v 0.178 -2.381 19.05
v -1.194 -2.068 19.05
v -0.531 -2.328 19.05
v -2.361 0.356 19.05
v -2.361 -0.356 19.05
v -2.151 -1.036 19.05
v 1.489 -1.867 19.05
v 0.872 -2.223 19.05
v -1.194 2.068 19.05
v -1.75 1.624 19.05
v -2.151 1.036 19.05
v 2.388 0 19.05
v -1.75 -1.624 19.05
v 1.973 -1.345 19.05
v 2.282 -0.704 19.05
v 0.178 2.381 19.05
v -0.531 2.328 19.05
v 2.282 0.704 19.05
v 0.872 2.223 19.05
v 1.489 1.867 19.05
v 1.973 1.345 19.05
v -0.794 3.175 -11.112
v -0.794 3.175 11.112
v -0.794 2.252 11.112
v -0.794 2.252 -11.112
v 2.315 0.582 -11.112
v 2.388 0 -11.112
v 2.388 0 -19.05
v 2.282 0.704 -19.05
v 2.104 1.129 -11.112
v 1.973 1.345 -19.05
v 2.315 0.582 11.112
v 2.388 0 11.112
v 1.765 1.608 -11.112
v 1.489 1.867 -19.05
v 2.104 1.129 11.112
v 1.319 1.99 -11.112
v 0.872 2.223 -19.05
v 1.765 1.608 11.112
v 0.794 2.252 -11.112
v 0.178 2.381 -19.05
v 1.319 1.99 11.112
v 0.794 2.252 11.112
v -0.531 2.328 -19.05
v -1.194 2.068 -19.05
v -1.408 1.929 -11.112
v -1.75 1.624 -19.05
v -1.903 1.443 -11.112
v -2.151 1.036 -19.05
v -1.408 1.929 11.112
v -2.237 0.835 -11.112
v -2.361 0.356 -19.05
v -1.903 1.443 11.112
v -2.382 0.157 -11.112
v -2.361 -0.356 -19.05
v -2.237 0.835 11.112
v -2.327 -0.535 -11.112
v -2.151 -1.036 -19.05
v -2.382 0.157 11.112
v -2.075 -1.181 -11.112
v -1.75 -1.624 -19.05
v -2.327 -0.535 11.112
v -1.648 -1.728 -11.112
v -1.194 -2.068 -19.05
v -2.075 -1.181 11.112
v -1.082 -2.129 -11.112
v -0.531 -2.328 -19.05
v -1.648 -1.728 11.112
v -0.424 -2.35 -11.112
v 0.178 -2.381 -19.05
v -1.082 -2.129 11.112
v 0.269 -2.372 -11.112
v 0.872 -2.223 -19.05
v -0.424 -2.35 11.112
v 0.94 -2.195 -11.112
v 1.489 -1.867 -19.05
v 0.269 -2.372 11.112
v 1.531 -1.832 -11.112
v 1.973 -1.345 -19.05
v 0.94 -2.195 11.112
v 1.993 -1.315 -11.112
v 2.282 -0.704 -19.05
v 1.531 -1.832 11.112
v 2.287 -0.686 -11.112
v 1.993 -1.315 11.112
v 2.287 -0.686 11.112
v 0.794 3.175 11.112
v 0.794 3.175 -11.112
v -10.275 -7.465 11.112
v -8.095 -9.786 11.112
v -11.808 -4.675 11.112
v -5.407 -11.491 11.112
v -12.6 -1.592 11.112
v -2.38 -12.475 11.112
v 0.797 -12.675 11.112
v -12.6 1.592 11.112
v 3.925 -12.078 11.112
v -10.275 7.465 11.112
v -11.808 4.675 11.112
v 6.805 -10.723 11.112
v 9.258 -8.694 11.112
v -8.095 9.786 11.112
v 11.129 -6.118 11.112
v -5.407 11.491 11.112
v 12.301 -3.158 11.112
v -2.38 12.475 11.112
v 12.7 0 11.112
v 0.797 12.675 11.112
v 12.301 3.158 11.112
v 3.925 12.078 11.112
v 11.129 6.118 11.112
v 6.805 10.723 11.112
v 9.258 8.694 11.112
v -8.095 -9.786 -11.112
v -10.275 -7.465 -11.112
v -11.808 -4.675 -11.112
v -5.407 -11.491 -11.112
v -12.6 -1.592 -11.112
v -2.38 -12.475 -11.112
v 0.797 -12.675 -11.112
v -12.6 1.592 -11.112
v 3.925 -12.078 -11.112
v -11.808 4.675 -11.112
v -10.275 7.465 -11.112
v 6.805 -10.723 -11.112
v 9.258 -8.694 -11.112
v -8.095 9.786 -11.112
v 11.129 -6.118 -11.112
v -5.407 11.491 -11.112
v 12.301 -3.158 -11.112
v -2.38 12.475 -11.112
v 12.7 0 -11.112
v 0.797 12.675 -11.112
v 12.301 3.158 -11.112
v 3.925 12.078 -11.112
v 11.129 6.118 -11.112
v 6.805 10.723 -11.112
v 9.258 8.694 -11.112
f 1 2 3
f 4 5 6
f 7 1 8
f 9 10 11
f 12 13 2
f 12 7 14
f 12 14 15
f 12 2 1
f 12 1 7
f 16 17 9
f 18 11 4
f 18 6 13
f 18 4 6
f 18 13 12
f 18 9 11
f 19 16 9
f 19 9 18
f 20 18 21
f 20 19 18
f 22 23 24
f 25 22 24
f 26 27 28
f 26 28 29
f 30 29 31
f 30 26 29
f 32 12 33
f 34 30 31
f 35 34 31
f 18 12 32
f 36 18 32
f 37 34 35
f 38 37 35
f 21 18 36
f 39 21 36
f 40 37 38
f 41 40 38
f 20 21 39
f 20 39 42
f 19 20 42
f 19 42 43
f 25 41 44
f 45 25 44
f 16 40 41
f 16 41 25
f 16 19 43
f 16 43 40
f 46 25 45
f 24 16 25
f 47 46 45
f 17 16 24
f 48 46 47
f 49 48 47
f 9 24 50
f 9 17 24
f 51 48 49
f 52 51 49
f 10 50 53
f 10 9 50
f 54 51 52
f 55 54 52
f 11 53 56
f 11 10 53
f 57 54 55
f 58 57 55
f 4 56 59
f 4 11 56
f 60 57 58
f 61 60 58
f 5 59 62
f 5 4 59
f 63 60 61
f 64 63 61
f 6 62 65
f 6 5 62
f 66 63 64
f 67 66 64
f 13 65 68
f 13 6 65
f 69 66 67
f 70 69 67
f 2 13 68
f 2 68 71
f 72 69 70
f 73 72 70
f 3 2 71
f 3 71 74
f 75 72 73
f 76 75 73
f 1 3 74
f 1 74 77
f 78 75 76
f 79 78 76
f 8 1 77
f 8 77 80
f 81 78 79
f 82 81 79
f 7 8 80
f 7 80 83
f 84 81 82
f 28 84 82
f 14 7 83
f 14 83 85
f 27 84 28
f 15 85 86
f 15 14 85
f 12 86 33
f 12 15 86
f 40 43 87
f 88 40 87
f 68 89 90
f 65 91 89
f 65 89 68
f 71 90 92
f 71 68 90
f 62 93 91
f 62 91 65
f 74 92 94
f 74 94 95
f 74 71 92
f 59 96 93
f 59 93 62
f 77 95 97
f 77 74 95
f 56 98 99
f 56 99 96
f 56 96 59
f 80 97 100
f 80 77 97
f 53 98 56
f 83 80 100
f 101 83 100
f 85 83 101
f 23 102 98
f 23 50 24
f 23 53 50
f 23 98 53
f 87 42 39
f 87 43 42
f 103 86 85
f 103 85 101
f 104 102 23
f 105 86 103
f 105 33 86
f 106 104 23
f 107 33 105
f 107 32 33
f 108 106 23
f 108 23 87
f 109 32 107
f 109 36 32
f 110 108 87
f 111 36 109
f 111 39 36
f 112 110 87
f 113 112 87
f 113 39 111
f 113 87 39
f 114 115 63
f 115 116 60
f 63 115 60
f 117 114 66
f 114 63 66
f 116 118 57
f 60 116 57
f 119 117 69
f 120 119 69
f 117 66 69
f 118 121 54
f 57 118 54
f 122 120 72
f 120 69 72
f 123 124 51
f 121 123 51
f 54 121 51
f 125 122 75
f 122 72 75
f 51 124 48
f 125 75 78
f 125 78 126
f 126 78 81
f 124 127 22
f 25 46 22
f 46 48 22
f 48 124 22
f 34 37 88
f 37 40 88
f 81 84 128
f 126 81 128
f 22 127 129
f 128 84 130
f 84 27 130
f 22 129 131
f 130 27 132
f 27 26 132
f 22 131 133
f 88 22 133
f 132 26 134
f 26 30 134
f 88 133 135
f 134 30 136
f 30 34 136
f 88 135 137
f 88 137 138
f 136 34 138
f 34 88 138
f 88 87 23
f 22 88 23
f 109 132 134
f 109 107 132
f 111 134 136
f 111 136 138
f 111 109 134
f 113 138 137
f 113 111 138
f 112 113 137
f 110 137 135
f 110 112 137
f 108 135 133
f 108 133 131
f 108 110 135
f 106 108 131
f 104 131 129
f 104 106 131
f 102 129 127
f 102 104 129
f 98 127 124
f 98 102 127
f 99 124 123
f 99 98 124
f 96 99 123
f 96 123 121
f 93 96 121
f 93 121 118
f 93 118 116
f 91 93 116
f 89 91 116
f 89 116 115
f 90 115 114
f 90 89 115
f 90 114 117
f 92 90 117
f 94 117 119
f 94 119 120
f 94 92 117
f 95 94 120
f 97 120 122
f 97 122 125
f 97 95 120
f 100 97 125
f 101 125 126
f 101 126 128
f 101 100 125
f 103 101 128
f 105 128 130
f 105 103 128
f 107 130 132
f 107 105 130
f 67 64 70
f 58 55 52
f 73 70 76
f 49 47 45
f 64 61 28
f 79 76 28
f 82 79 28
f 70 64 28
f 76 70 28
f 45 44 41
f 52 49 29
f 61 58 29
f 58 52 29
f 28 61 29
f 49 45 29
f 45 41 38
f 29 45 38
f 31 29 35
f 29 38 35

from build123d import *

# Parameters (mm, degrees)
SKETCH1_R           = 12.7
EXTRUDE1_DEPTH      = 11.1125
EXTRUDE2_DEPTH      = 23.225
SKETCH4_R           = 2.3876
BOSS_EXTRUDE1_DEPTH = 19.05


with BuildPart() as part:
    # Sketch1 → Extrude1 (new body, symmetric)
    with BuildSketch(Plane.XY):
        Circle(SKETCH1_R)
    extrude(amount=EXTRUDE1_DEPTH, both=True)

    # Sketch2 → Extrude2 (cut, through all)
    with BuildSketch(Plane.XY.offset(11.1125)):
        with BuildLine():
            ThreePointArc((0.79375, 2.24506403), (0, 2.38125), (-0.79375, 2.24506403))
            Line((-0.79375, 2.24506403), (-0.79375, 1.5875))
            Line((-0.79375, 1.5875), (0.79375, 1.5875))
            Line((0.79375, 1.5875), (0.79375, 2.24506403))
        make_face()
        with BuildLine():
            Line((-0.79375, 1.5875), (-0.79375, 2.24506403))
            ThreePointArc((-0.79375, 2.24506403), (-1.374815329, -1.944282483), (2.38125, 0))
            ThreePointArc((2.38125, 0), (1.944282483, 1.374815329), (0.79375, 2.24506403))
            Line((0.79375, 2.24506403), (0.79375, 1.5875))
            Line((0.79375, 1.5875), (-0.79375, 1.5875))
        make_face()
        with BuildLine():
            Line((0.79375, 3.175), (-0.79375, 3.175))
            Line((-0.79375, 3.175), (-0.79375, 2.24506403))
            ThreePointArc((-0.79375, 2.24506403), (0, 2.38125), (0.79375, 2.24506403))
            Line((0.79375, 2.24506403), (0.79375, 3.175))
        make_face()
    extrude(amount=-EXTRUDE2_DEPTH, mode=Mode.SUBTRACT)

    # Sketch4 → Boss-Extrude1 (add, symmetric)
    with BuildSketch(Plane.XY):
        Circle(SKETCH4_R)
    extrude(amount=BOSS_EXTRUDE1_DEPTH, both=True)


solid = part.part
